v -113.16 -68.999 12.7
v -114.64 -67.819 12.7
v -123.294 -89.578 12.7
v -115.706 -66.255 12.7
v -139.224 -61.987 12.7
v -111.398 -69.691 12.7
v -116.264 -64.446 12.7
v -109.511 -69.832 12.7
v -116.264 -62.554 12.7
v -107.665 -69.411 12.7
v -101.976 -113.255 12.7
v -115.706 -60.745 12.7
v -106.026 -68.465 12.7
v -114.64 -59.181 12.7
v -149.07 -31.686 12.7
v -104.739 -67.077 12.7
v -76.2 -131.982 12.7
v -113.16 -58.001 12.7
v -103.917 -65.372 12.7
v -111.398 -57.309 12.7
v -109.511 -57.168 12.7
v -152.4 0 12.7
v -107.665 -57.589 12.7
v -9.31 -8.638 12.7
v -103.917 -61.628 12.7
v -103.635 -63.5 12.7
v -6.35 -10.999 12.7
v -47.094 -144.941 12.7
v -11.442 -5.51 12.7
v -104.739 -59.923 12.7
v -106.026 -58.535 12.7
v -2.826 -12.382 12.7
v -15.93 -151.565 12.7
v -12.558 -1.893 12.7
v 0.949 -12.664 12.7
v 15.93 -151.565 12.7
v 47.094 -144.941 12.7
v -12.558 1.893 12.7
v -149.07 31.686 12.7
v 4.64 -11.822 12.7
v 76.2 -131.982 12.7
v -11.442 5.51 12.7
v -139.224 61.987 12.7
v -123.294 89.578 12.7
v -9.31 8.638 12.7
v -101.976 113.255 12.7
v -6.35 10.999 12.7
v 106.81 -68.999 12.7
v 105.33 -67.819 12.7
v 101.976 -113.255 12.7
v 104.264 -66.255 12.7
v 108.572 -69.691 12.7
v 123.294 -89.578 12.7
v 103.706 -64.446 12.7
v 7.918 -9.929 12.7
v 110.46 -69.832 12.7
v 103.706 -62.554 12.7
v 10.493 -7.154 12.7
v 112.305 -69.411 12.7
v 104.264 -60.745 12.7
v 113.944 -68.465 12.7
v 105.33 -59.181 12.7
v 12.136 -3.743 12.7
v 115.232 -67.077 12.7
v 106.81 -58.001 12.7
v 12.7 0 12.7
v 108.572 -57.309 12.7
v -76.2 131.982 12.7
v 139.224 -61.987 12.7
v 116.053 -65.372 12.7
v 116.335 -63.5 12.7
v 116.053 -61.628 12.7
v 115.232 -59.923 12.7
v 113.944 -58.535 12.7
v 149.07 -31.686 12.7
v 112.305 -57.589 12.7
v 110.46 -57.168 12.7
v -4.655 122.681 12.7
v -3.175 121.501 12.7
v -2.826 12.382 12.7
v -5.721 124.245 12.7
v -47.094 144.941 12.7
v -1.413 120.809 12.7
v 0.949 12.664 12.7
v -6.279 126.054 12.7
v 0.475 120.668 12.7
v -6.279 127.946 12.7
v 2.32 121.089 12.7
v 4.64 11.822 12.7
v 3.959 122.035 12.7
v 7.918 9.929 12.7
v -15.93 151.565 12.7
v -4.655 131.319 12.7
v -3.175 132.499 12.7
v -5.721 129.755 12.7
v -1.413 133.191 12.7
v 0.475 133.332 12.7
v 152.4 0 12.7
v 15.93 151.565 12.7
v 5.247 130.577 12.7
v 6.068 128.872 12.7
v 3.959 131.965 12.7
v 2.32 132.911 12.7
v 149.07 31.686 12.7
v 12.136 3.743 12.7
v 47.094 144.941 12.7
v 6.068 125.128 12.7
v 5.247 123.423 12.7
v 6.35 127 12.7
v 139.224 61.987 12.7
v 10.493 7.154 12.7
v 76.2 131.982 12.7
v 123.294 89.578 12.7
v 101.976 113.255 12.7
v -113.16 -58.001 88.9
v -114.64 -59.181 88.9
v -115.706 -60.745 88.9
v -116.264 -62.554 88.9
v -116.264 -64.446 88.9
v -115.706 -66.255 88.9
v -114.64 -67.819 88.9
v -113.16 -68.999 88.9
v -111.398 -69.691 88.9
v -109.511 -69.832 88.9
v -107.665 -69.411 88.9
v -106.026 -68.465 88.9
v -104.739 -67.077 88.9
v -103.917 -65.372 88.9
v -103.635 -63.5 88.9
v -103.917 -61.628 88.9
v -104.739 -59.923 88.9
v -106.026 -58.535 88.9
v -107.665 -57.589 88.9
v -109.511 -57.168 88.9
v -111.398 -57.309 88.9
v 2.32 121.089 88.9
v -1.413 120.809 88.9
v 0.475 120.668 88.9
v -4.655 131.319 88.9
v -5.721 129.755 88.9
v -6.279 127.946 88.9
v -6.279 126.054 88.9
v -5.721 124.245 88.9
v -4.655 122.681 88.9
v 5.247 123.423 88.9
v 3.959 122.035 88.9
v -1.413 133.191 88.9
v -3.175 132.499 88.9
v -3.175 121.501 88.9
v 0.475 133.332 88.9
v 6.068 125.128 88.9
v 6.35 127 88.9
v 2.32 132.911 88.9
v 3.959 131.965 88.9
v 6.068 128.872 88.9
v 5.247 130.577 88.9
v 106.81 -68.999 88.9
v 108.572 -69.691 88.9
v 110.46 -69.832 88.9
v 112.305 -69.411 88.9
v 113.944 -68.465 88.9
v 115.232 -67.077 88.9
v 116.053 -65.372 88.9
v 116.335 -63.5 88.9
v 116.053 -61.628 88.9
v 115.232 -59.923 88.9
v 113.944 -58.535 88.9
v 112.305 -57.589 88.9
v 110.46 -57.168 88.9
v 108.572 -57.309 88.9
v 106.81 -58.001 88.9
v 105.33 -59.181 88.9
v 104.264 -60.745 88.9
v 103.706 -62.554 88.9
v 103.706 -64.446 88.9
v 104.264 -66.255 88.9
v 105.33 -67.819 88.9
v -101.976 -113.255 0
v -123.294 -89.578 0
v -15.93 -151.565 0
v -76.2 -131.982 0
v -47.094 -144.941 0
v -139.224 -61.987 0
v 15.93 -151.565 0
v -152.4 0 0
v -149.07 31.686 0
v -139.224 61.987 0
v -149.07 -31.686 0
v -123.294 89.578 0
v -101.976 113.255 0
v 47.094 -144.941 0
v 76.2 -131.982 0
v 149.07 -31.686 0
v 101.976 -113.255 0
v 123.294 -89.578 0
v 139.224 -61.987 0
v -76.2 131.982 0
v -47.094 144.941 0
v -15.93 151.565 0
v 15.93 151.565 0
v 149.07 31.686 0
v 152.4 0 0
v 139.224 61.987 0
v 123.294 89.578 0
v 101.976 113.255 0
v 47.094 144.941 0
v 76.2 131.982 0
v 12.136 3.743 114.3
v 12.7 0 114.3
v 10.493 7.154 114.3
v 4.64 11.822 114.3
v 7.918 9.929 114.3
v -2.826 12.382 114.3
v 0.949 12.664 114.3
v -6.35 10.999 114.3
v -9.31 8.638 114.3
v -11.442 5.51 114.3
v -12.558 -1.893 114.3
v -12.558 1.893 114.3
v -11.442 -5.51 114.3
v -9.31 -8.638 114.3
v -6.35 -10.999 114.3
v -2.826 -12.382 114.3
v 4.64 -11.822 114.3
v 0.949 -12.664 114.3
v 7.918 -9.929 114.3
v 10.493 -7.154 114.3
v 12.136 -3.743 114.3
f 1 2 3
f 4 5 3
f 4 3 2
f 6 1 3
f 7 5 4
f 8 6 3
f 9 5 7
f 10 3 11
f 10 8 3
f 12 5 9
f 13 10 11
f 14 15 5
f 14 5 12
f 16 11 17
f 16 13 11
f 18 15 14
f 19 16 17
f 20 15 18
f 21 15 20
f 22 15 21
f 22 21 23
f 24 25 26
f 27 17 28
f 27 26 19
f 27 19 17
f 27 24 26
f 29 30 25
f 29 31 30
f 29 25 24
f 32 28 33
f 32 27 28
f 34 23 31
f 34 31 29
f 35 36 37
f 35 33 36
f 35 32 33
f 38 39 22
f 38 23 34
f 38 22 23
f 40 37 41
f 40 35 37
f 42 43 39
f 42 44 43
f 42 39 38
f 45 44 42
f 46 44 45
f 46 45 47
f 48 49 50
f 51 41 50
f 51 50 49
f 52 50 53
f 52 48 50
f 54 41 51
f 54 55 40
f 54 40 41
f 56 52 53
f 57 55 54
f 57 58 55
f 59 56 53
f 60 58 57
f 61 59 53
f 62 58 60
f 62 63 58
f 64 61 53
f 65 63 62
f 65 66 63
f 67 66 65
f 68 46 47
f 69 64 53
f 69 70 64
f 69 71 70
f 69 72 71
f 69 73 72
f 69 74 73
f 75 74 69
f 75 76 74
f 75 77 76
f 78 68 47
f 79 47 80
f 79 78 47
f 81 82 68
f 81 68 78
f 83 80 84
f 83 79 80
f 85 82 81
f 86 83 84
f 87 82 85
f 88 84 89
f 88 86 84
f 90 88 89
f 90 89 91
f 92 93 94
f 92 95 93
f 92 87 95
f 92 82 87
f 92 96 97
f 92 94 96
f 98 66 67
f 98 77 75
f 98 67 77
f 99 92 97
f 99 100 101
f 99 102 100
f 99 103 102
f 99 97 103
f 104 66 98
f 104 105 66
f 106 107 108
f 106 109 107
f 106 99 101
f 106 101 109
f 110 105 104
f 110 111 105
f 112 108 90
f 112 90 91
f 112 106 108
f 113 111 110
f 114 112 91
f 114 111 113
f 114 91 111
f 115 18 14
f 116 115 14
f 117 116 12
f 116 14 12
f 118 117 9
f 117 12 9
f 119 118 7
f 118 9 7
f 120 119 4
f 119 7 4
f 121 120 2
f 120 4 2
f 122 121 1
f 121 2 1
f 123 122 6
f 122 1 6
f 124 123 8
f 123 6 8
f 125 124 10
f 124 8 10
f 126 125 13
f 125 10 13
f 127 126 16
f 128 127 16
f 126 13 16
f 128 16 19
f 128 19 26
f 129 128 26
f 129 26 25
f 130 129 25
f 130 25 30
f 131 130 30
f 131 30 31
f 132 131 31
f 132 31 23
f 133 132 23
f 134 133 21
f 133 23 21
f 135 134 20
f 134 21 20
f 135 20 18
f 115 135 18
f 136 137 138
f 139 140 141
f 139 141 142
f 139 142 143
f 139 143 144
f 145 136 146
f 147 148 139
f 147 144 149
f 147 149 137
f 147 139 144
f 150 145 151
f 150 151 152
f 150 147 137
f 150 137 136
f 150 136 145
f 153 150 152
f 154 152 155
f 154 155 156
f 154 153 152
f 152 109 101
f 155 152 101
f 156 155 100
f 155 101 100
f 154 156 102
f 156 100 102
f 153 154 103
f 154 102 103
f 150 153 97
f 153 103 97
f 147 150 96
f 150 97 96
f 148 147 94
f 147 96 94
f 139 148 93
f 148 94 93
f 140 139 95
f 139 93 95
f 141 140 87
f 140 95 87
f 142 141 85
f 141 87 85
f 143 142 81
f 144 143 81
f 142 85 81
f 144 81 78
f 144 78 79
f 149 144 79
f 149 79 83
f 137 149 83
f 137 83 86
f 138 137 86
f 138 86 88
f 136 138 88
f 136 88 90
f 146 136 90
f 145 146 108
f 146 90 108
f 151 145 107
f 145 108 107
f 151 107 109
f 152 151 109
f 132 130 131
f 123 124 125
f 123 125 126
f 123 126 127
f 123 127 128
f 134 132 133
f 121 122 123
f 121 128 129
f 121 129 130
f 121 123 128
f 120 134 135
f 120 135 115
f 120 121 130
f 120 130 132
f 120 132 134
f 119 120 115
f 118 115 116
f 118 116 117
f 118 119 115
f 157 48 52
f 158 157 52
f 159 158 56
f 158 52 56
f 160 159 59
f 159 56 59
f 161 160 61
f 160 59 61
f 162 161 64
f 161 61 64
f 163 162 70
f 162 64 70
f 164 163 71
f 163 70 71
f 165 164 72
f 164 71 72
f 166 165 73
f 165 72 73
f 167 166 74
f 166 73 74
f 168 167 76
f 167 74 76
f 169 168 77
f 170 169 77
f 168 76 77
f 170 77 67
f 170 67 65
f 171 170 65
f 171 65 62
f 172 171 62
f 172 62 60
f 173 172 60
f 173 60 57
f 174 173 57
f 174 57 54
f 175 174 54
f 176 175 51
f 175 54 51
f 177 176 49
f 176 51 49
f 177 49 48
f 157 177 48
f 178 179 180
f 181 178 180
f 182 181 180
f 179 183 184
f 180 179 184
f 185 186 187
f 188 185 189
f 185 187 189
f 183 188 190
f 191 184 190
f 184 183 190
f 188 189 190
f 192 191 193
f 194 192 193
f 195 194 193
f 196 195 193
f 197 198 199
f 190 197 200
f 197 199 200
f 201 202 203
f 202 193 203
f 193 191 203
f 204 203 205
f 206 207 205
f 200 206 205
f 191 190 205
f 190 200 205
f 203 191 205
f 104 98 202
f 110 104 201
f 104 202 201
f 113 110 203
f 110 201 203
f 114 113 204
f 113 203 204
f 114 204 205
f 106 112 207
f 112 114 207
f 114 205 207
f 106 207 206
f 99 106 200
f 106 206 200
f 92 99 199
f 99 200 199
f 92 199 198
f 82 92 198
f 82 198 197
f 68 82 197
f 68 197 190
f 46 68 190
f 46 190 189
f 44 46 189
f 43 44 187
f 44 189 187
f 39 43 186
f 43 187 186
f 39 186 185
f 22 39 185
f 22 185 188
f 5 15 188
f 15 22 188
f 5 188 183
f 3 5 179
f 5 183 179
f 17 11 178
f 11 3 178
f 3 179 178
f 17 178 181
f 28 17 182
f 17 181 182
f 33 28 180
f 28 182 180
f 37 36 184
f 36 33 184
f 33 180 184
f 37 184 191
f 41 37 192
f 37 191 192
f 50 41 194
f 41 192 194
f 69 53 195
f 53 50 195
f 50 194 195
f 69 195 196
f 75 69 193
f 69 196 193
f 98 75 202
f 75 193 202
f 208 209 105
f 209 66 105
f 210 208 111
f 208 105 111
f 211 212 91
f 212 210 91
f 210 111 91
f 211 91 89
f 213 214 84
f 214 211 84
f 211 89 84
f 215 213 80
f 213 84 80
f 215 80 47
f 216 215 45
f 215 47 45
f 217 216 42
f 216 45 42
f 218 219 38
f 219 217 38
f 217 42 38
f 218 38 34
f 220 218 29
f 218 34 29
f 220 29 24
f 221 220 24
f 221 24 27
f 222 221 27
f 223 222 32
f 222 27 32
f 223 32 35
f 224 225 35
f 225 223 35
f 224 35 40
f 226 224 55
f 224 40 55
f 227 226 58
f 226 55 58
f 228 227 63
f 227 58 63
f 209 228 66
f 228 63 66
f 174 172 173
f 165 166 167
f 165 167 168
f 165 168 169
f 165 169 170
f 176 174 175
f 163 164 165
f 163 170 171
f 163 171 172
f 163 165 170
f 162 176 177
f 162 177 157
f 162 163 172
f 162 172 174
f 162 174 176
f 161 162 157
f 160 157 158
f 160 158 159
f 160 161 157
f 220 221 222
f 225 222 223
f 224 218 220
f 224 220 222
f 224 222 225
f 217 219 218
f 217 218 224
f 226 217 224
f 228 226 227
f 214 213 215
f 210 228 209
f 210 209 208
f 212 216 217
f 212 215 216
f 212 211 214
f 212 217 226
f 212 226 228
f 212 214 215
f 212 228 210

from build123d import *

# Parameters (mm, degrees)
F0_R     = 152.4
F1_DEPTH = 12.7
F2_R     = 12.7
F3_DEPTH = 101.6
F4_R     = 6.35
F5_DEPTH = 76.2
F6_COUNT = 3


with BuildPart() as f1:
    # F0 (on Top) → F1 (new body)
    with BuildSketch(Plane.XY):
        Circle(F0_R)
    extrude(amount=F1_DEPTH)

    # F2 (on face) → F3 (join)
    with BuildSketch(Plane.XY.offset(12.7)):
        Circle(F2_R)
    extrude(amount=F3_DEPTH)

    # F4 (on face) → F5 (join)
    with BuildSketch(Plane.XY.offset(12.7)):
        with Locations((0, 127)):
            Circle(F4_R)
    extrude(amount=F5_DEPTH)

    # F6: F1 ×3 about axis
    f6_axis = Axis((0, 0, 12.7), (0, 0, -1))


with BuildPart() as f1_1:
    add(f1.part)
    for i in range(1, F6_COUNT):
        add(f1.part.rotate(f6_axis, i * 360 / F6_COUNT))


solid = f1_1.part
